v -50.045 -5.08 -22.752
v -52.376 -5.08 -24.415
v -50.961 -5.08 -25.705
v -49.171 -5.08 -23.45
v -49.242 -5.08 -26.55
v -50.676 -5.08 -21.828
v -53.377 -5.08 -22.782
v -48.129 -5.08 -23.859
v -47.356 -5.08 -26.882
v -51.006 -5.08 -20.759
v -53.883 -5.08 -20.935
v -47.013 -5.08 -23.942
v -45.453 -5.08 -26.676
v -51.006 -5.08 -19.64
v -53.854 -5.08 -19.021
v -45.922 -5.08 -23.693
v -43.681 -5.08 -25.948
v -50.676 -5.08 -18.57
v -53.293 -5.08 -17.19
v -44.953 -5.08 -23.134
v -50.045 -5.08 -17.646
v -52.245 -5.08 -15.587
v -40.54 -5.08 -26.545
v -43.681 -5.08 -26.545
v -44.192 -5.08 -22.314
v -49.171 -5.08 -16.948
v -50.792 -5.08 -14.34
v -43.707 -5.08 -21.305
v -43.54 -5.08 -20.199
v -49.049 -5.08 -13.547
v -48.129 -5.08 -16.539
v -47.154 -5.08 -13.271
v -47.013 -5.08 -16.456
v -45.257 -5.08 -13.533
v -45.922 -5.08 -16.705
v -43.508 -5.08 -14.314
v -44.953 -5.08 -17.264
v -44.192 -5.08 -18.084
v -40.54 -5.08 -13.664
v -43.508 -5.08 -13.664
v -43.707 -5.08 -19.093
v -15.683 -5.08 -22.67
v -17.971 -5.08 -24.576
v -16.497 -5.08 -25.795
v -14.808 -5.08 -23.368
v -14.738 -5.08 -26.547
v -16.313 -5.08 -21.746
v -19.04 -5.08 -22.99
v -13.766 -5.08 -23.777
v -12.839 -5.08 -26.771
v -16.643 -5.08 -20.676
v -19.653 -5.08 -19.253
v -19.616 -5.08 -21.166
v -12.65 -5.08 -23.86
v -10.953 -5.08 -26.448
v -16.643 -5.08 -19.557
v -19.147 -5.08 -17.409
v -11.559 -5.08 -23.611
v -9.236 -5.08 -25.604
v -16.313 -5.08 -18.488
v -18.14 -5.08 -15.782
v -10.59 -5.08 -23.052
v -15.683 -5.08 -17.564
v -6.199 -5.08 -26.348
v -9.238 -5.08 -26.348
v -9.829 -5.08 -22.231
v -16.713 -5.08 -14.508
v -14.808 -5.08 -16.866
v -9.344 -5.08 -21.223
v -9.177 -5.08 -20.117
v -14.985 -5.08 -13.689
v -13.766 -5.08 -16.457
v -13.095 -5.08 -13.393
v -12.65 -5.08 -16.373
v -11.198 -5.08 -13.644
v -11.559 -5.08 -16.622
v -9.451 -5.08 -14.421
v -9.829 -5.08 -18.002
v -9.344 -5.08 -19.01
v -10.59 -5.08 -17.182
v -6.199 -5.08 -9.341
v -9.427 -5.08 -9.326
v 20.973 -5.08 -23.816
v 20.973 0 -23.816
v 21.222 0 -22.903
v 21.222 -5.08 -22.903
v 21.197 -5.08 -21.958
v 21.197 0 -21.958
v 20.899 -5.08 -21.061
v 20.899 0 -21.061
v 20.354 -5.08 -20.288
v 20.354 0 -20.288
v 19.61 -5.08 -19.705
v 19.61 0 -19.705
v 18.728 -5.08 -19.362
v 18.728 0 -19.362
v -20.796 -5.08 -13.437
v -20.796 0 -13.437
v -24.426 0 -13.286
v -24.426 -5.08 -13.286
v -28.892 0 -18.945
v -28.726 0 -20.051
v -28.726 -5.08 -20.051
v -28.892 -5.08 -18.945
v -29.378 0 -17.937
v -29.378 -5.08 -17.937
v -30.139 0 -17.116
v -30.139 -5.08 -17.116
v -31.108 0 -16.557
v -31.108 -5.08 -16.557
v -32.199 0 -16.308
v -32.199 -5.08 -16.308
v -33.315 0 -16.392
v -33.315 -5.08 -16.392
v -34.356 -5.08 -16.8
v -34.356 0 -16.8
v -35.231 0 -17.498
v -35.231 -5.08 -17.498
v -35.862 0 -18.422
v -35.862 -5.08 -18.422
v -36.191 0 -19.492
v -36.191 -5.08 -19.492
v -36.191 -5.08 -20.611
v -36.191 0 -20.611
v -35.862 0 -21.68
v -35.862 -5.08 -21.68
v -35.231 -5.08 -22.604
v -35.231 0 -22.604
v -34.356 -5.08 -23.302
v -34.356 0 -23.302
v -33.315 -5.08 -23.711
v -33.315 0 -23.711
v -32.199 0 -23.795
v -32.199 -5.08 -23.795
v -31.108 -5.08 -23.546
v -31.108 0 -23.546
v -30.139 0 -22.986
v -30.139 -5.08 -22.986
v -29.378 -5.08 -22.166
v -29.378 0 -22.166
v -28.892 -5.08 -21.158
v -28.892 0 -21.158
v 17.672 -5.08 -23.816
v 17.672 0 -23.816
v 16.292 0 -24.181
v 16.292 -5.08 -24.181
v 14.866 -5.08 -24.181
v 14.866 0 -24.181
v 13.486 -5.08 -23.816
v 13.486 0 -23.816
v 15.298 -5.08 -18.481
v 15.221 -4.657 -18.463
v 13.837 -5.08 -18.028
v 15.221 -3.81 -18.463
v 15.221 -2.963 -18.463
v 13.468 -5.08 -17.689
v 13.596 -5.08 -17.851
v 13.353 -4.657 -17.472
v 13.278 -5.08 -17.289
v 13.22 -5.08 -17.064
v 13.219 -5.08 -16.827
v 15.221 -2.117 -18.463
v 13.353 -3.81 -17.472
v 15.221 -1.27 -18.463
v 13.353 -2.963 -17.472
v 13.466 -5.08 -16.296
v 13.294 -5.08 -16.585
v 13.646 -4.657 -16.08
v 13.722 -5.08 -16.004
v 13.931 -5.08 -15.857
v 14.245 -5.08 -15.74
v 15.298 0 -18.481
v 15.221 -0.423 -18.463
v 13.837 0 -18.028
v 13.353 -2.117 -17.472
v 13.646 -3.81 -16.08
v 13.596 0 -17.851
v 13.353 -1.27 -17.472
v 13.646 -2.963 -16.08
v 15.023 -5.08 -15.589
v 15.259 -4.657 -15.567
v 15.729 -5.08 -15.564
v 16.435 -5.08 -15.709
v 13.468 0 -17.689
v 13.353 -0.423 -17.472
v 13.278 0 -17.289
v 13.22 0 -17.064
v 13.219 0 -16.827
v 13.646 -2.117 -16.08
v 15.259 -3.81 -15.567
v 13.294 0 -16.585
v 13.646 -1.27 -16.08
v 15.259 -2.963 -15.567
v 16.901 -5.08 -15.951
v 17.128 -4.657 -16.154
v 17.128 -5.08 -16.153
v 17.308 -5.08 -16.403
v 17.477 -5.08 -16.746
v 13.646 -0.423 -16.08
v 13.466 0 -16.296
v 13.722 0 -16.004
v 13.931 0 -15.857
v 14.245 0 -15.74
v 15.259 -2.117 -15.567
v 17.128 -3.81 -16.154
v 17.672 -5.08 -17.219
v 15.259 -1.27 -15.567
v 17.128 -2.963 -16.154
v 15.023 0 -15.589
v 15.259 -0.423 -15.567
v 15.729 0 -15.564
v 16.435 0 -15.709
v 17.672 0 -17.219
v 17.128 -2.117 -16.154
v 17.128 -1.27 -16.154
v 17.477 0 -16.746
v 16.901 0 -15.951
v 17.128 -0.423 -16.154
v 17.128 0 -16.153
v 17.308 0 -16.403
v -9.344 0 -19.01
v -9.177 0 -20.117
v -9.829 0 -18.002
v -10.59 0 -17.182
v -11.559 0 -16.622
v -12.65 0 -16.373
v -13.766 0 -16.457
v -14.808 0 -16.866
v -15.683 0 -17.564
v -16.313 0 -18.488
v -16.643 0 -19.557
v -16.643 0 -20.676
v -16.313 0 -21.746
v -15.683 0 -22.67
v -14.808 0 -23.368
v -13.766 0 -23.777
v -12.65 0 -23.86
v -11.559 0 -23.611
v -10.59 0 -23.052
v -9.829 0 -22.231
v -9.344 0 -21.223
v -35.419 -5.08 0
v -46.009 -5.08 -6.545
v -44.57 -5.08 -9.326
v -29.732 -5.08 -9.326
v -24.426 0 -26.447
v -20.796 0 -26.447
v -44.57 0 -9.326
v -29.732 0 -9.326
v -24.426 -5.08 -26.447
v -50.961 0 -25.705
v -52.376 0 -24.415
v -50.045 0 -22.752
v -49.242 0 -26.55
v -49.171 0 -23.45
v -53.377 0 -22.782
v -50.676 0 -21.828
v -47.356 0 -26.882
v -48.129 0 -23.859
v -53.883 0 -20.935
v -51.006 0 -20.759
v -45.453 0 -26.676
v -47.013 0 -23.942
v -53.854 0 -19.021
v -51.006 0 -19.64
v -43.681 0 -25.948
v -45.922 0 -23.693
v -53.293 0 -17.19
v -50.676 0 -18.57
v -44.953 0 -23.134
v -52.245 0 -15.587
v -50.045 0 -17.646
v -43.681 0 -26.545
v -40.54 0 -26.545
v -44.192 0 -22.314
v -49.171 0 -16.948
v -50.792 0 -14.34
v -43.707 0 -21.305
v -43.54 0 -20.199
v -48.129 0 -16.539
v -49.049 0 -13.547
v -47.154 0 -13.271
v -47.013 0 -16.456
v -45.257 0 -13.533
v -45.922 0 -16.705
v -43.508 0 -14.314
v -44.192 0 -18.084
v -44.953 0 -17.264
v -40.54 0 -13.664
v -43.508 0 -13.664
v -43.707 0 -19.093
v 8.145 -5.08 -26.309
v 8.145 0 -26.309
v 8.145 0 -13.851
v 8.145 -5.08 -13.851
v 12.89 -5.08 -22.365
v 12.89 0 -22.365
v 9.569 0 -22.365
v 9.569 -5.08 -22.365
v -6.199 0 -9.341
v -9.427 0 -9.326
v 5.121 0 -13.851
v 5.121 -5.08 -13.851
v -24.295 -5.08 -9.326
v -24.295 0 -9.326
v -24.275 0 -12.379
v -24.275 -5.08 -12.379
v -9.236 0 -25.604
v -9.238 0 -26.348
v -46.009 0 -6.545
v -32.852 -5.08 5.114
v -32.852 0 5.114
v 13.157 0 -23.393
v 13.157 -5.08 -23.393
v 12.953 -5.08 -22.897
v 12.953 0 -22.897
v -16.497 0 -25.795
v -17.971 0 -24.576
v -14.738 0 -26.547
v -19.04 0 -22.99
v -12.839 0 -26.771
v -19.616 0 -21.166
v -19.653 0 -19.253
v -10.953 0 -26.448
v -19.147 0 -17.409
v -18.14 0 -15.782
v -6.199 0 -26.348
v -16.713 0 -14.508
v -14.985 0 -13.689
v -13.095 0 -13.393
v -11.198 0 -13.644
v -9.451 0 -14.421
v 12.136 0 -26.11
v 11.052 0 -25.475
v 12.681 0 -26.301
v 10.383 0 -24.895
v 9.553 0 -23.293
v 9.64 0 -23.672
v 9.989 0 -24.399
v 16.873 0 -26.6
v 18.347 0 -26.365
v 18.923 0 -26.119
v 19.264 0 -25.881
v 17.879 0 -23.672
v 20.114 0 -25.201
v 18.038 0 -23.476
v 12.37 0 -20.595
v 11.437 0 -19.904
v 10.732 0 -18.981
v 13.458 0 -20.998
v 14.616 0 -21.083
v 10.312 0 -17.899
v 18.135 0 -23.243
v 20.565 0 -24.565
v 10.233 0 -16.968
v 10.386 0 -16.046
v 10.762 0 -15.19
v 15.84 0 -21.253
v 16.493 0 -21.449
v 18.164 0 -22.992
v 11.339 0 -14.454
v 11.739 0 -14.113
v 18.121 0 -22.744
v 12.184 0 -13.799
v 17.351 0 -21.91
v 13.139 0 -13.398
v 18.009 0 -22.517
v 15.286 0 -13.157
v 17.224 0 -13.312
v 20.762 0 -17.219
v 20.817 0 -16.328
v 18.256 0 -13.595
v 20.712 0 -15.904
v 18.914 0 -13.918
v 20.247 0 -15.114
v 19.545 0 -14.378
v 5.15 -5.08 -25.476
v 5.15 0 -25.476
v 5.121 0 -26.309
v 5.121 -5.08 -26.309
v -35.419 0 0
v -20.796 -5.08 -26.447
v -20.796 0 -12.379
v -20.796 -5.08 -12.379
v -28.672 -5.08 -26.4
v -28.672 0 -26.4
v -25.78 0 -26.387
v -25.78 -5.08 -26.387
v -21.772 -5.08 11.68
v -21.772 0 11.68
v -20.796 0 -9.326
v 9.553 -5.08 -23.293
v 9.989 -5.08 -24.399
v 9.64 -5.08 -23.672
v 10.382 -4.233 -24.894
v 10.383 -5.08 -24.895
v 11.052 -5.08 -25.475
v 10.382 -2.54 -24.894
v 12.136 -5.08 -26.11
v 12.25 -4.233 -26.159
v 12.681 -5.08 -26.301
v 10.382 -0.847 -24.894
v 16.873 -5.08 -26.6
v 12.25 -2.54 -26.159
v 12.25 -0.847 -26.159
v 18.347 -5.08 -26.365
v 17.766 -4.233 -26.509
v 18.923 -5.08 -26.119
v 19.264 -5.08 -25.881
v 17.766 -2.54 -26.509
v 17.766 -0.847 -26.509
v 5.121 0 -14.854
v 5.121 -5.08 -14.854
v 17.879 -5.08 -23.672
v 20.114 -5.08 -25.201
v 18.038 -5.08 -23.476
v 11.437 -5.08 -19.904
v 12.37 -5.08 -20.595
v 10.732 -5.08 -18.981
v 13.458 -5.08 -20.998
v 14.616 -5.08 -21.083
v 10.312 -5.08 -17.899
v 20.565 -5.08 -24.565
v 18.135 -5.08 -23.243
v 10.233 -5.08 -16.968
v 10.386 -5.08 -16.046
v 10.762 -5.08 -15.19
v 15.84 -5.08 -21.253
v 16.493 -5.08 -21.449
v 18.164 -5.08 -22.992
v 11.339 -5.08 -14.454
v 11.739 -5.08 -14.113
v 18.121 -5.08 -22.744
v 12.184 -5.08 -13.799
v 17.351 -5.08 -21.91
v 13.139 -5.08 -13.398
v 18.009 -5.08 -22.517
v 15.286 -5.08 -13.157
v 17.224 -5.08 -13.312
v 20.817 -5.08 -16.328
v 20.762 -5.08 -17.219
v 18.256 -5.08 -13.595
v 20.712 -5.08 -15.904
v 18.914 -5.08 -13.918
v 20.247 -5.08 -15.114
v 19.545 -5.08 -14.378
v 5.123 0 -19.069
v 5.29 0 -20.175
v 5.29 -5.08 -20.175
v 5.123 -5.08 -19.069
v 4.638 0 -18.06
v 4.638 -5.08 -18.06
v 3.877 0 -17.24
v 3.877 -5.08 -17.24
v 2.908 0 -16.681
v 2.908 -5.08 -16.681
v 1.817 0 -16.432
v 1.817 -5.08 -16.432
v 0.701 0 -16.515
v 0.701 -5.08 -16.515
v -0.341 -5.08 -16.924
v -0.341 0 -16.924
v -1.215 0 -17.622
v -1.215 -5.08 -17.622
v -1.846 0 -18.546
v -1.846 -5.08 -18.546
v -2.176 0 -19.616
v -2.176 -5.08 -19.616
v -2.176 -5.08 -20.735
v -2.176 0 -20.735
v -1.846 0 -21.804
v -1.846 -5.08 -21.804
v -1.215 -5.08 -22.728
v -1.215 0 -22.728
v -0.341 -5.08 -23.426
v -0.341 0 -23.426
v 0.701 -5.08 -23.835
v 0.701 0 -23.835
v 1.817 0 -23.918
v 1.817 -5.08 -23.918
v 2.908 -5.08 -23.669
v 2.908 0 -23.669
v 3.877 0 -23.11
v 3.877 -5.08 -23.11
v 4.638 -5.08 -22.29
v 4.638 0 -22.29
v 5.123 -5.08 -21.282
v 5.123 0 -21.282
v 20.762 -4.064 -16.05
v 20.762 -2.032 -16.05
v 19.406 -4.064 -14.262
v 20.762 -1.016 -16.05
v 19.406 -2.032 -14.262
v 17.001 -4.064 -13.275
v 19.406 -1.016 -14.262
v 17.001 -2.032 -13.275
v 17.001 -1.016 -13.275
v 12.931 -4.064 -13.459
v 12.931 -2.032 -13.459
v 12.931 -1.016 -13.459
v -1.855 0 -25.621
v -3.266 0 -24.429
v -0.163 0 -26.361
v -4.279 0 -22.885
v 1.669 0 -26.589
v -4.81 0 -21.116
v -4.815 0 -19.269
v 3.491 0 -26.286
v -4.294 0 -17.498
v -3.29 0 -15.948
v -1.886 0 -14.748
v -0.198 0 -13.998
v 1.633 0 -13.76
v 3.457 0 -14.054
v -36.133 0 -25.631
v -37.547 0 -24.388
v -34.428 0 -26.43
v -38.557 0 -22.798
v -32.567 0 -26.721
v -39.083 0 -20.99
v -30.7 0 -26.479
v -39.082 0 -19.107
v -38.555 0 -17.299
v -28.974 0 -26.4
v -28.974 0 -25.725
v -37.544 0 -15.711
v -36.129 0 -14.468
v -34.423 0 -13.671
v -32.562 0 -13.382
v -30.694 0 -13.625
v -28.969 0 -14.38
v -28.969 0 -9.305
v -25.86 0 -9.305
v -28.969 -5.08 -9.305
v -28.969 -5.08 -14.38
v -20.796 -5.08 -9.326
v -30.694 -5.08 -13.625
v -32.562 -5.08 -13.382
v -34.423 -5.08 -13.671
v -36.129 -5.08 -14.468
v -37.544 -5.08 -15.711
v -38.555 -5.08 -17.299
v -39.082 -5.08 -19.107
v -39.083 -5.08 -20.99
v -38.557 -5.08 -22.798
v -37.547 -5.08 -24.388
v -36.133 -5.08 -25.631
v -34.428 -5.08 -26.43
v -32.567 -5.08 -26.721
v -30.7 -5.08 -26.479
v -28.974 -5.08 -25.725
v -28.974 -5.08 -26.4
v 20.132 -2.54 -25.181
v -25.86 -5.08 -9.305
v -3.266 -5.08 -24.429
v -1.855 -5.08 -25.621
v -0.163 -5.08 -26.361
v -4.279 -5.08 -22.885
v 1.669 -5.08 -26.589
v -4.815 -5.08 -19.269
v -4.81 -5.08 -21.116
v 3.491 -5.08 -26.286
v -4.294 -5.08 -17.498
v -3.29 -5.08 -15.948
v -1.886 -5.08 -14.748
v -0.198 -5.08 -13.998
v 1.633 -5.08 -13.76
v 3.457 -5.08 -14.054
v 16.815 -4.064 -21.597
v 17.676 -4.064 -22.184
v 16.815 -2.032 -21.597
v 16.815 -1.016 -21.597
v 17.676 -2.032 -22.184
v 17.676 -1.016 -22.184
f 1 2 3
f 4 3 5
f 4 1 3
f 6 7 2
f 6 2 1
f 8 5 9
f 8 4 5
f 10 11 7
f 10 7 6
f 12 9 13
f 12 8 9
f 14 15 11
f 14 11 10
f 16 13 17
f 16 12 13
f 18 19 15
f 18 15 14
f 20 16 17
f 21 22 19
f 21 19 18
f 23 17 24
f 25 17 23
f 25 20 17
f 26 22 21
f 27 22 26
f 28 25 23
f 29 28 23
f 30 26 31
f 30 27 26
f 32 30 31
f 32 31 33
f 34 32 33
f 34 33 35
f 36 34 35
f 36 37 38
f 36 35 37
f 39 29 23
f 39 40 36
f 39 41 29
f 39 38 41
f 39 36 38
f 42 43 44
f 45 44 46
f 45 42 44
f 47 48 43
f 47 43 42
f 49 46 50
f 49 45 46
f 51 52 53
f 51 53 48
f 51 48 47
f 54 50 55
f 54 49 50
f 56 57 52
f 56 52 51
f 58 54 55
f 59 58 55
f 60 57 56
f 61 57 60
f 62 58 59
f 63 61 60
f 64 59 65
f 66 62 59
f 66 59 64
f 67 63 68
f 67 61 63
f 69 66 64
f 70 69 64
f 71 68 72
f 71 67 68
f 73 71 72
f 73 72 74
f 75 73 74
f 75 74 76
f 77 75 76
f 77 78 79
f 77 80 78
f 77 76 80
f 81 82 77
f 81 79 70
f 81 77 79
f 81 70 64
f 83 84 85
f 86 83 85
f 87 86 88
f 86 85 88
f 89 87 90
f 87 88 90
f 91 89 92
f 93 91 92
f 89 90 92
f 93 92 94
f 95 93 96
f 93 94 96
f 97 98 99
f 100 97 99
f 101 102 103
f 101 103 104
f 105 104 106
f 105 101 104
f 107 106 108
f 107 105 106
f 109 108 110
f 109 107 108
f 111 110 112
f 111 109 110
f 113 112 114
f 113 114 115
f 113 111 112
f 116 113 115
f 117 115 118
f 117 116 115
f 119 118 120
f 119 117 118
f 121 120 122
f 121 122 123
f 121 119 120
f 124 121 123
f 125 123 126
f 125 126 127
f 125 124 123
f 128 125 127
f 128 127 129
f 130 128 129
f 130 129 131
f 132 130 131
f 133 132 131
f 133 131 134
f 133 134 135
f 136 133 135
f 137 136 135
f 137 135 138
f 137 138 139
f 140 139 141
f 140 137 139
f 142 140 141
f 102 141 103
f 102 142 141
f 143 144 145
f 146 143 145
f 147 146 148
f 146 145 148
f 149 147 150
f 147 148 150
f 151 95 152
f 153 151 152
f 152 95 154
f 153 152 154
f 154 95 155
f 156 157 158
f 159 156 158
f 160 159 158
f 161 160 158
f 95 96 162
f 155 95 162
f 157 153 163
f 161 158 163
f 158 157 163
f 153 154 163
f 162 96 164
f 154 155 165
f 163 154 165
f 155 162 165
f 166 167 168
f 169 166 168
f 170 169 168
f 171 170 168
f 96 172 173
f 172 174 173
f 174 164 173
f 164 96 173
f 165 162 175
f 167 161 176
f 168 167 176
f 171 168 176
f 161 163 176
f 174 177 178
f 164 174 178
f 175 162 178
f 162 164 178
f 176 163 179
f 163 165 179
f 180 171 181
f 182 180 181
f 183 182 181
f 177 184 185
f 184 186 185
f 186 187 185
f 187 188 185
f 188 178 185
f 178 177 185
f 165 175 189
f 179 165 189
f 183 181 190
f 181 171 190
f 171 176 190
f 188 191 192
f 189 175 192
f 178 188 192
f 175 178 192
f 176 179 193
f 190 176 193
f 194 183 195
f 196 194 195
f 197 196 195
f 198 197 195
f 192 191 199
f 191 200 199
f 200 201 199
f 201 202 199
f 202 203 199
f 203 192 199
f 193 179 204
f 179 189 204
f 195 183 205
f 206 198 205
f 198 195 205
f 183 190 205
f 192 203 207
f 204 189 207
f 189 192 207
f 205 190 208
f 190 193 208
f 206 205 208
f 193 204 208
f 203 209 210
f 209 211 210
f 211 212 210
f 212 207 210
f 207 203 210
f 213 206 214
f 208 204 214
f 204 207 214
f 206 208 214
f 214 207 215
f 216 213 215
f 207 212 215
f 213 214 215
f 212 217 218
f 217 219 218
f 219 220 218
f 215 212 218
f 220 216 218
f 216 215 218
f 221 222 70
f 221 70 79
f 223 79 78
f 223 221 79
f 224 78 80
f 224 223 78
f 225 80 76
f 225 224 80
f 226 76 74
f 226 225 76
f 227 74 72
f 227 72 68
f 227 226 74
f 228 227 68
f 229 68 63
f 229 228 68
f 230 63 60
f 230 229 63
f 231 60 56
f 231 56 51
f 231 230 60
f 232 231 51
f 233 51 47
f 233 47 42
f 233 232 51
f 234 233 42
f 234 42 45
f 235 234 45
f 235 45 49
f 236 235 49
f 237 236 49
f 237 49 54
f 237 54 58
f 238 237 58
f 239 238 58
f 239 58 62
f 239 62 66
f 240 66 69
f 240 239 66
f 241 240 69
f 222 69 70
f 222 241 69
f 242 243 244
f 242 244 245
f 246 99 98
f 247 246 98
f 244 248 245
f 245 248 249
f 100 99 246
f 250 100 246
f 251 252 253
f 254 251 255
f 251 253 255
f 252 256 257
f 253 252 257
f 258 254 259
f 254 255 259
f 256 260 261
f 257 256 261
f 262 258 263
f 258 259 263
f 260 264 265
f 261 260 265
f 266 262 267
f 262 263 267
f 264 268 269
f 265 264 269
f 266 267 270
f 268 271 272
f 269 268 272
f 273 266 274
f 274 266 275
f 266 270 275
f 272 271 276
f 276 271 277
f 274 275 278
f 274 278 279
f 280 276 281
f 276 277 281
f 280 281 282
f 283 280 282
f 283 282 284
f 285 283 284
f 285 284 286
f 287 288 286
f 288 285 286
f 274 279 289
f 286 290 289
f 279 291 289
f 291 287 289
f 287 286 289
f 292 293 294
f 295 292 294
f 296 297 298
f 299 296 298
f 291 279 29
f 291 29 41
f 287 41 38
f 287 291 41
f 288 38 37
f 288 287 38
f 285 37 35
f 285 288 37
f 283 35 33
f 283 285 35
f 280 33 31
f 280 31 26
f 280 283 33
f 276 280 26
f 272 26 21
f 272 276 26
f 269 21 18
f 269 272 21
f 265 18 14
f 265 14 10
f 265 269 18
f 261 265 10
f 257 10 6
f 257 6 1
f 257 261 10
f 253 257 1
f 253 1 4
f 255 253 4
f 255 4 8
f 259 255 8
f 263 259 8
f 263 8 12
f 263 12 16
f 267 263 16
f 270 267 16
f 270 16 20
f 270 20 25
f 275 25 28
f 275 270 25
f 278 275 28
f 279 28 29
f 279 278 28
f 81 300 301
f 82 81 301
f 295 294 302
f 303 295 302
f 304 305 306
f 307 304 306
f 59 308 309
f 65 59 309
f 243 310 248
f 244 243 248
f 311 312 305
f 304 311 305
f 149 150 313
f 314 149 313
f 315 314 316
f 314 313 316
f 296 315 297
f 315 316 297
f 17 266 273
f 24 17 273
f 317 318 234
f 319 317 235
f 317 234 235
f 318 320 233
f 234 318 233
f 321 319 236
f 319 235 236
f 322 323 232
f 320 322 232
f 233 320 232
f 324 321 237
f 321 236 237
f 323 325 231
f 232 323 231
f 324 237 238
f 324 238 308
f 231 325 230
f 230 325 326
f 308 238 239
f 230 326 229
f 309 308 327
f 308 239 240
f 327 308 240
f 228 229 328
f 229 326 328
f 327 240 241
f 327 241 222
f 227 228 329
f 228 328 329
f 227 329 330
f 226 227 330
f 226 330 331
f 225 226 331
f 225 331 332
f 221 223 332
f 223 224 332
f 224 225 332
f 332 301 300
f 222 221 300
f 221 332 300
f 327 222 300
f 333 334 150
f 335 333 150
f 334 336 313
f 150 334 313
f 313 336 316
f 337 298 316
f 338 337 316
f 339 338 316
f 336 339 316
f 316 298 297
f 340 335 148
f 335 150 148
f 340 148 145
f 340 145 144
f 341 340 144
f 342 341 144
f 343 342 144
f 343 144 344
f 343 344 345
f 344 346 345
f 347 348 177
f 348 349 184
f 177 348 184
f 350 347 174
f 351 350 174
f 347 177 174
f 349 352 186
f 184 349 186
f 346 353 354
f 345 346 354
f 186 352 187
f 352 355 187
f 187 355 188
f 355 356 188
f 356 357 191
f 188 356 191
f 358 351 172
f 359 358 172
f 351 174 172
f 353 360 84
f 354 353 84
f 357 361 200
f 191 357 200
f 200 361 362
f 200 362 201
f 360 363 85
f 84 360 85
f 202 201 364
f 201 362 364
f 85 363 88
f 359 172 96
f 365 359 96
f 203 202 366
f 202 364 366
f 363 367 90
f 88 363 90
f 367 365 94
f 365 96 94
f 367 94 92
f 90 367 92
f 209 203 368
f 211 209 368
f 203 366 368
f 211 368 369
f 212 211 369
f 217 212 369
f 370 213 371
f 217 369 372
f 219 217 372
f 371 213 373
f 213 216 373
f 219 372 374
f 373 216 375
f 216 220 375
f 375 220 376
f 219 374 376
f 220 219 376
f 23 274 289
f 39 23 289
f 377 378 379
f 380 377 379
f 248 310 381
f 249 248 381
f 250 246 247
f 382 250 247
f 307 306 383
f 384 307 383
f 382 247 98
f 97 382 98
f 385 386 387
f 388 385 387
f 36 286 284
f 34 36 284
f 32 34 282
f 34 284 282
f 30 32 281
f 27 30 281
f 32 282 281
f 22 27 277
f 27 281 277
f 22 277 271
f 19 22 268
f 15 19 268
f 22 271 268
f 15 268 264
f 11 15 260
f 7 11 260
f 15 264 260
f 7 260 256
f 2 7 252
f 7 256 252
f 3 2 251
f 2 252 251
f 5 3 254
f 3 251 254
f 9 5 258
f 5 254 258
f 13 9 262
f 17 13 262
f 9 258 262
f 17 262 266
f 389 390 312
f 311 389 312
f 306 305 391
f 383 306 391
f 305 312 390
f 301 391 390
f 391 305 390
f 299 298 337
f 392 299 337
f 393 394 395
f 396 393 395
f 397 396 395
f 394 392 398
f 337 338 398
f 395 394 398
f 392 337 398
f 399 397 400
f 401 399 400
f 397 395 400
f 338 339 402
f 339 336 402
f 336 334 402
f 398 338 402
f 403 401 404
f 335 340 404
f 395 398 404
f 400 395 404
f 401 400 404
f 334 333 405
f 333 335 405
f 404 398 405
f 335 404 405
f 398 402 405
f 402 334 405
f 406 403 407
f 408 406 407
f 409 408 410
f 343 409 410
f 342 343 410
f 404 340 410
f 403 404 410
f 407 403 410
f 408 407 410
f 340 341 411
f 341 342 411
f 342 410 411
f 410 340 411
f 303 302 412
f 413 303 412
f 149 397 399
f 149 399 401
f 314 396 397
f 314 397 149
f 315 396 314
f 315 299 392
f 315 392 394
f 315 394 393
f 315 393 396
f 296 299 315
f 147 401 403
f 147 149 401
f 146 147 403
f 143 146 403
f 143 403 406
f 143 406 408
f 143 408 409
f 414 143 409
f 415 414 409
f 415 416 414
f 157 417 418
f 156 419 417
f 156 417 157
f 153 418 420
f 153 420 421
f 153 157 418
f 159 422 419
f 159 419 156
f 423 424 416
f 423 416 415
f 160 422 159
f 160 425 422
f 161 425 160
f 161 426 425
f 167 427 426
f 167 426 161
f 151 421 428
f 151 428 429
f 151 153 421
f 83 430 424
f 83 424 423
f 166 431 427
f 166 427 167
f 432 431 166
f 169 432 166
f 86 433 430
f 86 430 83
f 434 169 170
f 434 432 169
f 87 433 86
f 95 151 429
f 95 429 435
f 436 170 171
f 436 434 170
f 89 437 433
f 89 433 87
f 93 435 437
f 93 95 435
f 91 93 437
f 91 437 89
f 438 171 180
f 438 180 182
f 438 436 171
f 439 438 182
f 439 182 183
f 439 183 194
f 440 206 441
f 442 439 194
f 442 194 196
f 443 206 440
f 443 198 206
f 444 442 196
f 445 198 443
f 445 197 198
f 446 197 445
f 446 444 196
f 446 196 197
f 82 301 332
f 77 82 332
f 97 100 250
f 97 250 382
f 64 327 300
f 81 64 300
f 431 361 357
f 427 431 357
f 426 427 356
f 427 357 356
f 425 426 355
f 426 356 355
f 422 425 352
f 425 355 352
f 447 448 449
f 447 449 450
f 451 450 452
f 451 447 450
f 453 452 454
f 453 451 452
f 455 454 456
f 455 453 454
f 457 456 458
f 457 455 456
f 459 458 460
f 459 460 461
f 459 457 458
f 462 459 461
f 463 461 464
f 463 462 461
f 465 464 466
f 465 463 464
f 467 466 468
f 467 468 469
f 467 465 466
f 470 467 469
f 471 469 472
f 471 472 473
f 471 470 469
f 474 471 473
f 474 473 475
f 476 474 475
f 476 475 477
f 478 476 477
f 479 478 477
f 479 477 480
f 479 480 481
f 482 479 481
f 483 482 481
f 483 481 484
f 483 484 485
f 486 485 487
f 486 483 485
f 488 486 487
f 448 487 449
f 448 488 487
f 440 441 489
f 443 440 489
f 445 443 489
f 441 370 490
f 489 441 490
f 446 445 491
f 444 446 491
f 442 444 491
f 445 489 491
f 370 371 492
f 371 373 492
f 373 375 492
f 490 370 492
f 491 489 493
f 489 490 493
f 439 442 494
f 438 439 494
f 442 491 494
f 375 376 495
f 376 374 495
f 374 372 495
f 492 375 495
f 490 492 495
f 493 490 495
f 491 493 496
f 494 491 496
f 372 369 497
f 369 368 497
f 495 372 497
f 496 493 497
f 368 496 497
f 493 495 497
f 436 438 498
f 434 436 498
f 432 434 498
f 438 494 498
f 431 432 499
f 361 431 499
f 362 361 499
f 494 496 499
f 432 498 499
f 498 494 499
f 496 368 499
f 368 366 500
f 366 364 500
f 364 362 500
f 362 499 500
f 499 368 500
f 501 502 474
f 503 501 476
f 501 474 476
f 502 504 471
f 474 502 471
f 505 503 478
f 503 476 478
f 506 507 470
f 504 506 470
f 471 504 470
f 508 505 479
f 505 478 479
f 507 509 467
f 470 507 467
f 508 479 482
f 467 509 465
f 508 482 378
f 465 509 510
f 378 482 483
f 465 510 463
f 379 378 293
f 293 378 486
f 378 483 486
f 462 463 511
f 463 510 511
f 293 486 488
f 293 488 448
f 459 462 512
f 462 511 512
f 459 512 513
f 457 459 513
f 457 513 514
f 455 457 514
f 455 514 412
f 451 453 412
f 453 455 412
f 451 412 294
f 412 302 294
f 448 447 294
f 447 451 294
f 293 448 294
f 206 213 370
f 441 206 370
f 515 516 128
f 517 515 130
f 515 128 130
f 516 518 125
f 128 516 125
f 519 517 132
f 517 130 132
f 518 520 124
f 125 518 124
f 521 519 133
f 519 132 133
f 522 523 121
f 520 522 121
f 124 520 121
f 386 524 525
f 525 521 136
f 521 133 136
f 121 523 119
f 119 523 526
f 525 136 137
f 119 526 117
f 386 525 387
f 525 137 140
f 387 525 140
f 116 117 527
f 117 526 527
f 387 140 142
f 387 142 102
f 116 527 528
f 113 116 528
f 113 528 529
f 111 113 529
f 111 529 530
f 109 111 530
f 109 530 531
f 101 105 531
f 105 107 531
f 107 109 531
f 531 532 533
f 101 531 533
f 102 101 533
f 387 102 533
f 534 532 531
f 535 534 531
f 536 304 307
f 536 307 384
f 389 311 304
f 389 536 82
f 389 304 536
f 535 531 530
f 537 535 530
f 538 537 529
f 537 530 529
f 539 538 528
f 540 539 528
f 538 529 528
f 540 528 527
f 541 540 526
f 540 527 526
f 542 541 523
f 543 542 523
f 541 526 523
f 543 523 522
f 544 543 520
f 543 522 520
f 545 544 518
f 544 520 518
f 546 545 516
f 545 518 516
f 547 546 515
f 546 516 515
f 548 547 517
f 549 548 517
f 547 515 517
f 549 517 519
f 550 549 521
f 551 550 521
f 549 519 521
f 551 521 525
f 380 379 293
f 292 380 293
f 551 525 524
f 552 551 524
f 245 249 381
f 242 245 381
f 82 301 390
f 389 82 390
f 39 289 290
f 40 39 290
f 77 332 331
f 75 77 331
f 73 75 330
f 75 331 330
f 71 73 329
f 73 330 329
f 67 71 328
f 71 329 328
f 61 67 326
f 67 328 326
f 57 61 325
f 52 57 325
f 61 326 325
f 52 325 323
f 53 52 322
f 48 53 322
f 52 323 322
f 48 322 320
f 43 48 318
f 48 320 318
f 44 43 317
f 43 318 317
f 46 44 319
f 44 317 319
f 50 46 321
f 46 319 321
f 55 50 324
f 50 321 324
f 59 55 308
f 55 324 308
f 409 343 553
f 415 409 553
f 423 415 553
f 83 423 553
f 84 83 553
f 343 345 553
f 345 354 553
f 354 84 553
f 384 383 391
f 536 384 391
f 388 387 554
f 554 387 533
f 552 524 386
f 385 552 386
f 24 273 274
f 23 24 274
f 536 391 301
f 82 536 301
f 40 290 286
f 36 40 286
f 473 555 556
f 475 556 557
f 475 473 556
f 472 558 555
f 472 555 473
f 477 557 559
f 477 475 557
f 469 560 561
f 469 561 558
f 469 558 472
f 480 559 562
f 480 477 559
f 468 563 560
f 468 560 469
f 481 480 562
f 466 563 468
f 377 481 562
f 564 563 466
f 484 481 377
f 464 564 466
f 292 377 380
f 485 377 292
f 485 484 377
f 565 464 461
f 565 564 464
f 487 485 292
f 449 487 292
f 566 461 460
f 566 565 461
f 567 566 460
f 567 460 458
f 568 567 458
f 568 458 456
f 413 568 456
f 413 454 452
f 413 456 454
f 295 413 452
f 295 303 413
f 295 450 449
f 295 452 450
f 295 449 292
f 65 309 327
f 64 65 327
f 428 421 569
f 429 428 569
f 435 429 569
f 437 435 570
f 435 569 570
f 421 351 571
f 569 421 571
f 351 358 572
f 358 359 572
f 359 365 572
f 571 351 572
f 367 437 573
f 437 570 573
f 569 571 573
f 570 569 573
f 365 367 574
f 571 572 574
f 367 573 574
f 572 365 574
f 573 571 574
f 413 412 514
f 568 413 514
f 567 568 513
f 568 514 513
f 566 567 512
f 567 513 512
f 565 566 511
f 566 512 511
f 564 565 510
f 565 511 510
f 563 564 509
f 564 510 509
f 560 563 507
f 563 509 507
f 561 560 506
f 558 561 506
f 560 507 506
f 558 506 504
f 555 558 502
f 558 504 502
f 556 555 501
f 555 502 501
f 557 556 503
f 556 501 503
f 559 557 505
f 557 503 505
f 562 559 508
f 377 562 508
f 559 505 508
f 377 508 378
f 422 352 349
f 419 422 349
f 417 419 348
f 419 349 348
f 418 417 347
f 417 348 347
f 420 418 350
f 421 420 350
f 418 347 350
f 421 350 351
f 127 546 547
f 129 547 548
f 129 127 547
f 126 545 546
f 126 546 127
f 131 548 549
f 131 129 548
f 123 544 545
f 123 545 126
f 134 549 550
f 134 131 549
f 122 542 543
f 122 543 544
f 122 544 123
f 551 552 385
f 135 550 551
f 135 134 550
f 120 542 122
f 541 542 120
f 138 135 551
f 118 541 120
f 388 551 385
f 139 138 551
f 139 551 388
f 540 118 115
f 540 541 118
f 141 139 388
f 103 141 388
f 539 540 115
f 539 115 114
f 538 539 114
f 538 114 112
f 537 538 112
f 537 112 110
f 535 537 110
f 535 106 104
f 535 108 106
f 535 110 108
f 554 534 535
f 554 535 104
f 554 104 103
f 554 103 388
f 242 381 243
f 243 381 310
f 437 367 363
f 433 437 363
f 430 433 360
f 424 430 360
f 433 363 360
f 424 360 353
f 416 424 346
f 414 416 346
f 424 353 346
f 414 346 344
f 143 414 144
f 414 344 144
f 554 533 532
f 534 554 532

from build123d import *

# Parameters (mm, degrees)
F1_DEPTH = 5.08
F0_R     = 3.7538373981


with BuildPart() as f1:
    # F0 (on Front) → F1 (new body)
    with BuildSketch(Plane.XZ):
        Polygon((-35.4193560779, 0), (-46.0087582469, -6.5453746356), (-44.5702800546, -9.3264291063), (-29.7320385329, -9.3264291063), align=None)
    extrude(amount=F1_DEPTH)


with BuildPart() as f1b:
    # F0 (on Front) → F1, piece 2 (new body)
    with BuildSketch(Plane.XZ):
        Polygon((-20.7957308739, -13.4374247864), (-24.4261976331, -13.2861547172), (-24.4261976331, -26.4465939254), (-20.7957308739, -26.4465939254), align=None)
    extrude(amount=F1_DEPTH)


with BuildPart() as f1c:
    # F0 (on Front) → F1, piece 3 (new body)
    with BuildSketch(Plane.XZ):
        with BuildLine():
            add(Edge.make_bspline(
                [(20.7620002329, -17.2191361961), (20.8072727639, -16.8563093212), (20.9972345535, -15.9582499737), (19.4142520572, -14.007102602), (17.1088858085, -13.0550807236), (12.8312386114, -13.137547353), (11.777222385, -14.0693074001), (11.3386176527, -14.4538888708)],
                knots=[0, 0, 0, 0, 0.1426258855, 0.3402628508, 0.5529546626, 0.8192153992, 1, 1, 1, 1], degree=3))
            ThreePointArc((11.3386176527, -14.4538888708), (10.3859706919, -16.0456099138), (10.3123616427, -17.8991723806))
            ThreePointArc((10.3123616427, -17.8991723806), (11.8788420686, -20.2823297917), (14.6159762517, -21.083202213))
            add(Edge.make_bspline(
                [(14.6159762517, -21.083202213), (15.0039163067, -21.1453609503), (16.0043313157, -21.2129036743), (16.7959558011, -21.5836238263), (17.2771770943, -21.8291235959), (17.6796861205, -22.1913385939), (17.9065701329, -22.3787523433), (18.0092714727, -22.517317906)],
                knots=[0, 0, 0, 0, 0.2772850418, 0.4981757712, 0.6686560416, 0.8384583572, 1, 1, 1, 1], degree=3))
            ThreePointArc((18.0092714727, -22.517317906), (18.1354842373, -23.2431646305), (17.6717407787, -23.8156374544))
            ThreePointArc((17.6717407787, -23.8156374544), (15.5790164959, -24.2269686024), (13.4862922132, -23.8156374544))
            ThreePointArc((13.4862922132, -23.8156374544), (13.0376674048, -23.1521941948), (12.8897940501, -22.3650762568))
            Line((12.8897940501, -22.3650762568), (9.569176693, -22.3650762568))
            add(Edge.make_bspline(
                [(9.569176693, -22.3650762568), (9.5361497862, -22.6772252023), (9.4524468653, -23.4559209414), (10.231733471, -25.0315592148), (12.2911542795, -26.3031608631), (13.5748731983, -26.4278250015), (17.7011171683, -26.847175168), (19.0651818481, -26.0739997387), (19.2637275904, -25.8809141815)],
                knots=[0, 0, 0, 0, 0.1218054151, 0.2789918956, 0.4596472248, 0.6020193053, 0.8467697484, 1, 1, 1, 1], degree=3))
            add(Edge.make_bspline(
                [(19.2637275904, -25.8809141815), (19.5658528496, -25.681008759), (20.2303288514, -25.241348877), (20.711178218, -24.3187482231), (20.9733940461, -23.8156374544)],
                knots=[0, 0, 0, 0, 0.4546819726, 1, 1, 1, 1], degree=3))
            ThreePointArc((20.9733940461, -23.8156374544), (20.898861515, -21.0606348014), (18.7283706874, -19.362234294))
            add(Edge.make_bspline(
                [(18.7283706874, -19.362234294), (18.3052221446, -19.2454177359), (17.3465319172, -18.9807828356), (15.2853598147, -18.476270678), (13.6934778991, -18.0951068109), (13.3382544883, -17.4914174359), (13.0869415617, -16.7805254227), (13.6425426453, -16.0415724969), (14.0256014445, -15.7577248311), (15.2913806307, -15.5033570912), (16.3332392912, -15.6038072113), (17.1883368221, -16.0725065084), (17.5126857245, -16.8202796174), (17.6196698386, -17.1023734287), (17.6717407787, -17.2191361961)],
                knots=[0, 0, 0, 0, 0.1006907781, 0.2266515058, 0.3326625833, 0.3997628616, 0.4701676224, 0.5473676774, 0.6065693887, 0.7006658095, 0.7890167461, 0.8703441811, 0.9451782391, 1, 1, 1, 1], degree=3))
            Line((17.6717407787, -17.2191361961), (20.7620002329, -17.2191361961))
        make_face()
    extrude(amount=F1_DEPTH)


with BuildPart() as f1d:
    # F0 (on Front) → F1, piece 4 (new body)
    with BuildSketch(Plane.XZ):
        Polygon((-21.772207953, 11.6795980458), (-32.8522287309, 5.1136612892), (-24.2951400578, -9.3264291063), (-20.7957308739, -9.3264291063), (-9.4271954149, -9.3264291063), align=None)
        Polygon((-20.7957308739, -9.3264291063), (-24.2951400578, -9.3264291063), (-24.2749284953, -12.3785389587), (-20.7957308739, -12.3785389587), align=None)
    extrude(amount=F1_DEPTH)


with BuildPart() as f1e:
    # F0 (on Front) → F1, piece 5 (new body)
    with BuildSketch(Plane.XZ):
        with BuildLine():
            Line((-43.5080304742, -13.6637622491), (-43.5080304742, -14.3139054999))
            ThreePointArc((-43.5080304742, -14.3139054999), (-53.9360326233, -19.9770668695), (-43.6813160777, -25.9482823312))
            Line((-43.6813160777, -25.9482823312), (-43.6813160777, -26.5446212143))
            Line((-43.6813160777, -26.5446212143), (-40.5400656164, -26.5446212143))
            Line((-40.5400656164, -26.5446212143), (-40.5400656164, -13.6637622491))
            Line((-40.5400656164, -13.6637622491), (-43.5080304742, -13.6637622491))
        make_face()
        with Locations((-47.2937338054, -20.1990362257)):
            Circle(F0_R, mode=Mode.SUBTRACT)
    extrude(amount=F1_DEPTH)


with BuildPart() as f1f:
    # F0 (on Front) → F1, piece 6 (new body)
    with BuildSketch(Plane.XZ):
        with BuildLine():
            Line((-28.9690925023, -9.3052648008), (-28.9690925023, -14.3798987605))
            ThreePointArc((-28.9690925023, -14.3798987605), (-39.1494319925, -20.0484505957), (-28.9738103747, -25.7254671305))
            Line((-28.9738103747, -25.7254671305), (-28.9738103747, -26.4002234317))
            Line((-28.9738103747, -26.4002234317), (-28.6721715531, -26.4002234317))
            Line((-28.6721715531, -26.4002234317), (-25.7797478715, -26.3865933846))
            Line((-25.7797478715, -26.3865933846), (-25.860240683, -9.3052648008))
            Line((-25.860240683, -9.3052648008), (-28.9690925023, -9.3052648008))
        make_face()
        with Locations((-32.4795544147, -20.0512241572)):
            Circle(F0_R, mode=Mode.SUBTRACT)
    extrude(amount=F1_DEPTH)


with BuildPart() as f1g:
    # F0 (on Front) → F1, piece 7 (new body)
    with BuildSketch(Plane.XZ):
        with BuildLine():
            Line((-6.1985242487, -9.3412151397), (-9.4271954149, -9.3264291063))
            Line((-9.4271954149, -9.3264291063), (-9.4505250454, -14.4206760451))
            ThreePointArc((-9.4505250454, -14.4206760451), (-19.703495851, -20.2107797198), (-9.2364614829, -25.6042852998))
            Line((-9.2364614829, -25.6042852998), (-9.2380829155, -26.3478271663))
            Line((-9.2380829155, -26.3478271663), (-6.1985242487, -26.3478271663))
            Line((-6.1985242487, -26.3478271663), (-6.1985242487, -9.3412151397))
        make_face()
        with Locations((-12.9307592288, -20.1167901978)):
            Circle(F0_R, mode=Mode.SUBTRACT)
    extrude(amount=F1_DEPTH)


with BuildPart() as f1h:
    # F0 (on Front) → F1, piece 8 (new body)
    with BuildSketch(Plane.XZ):
        with BuildLine():
            Line((5.1207156486, -14.4008146599), (5.1207156486, -14.8542305873))
            ThreePointArc((5.1207156486, -14.8542305873), (-4.8791269628, -20.1930324208), (5.1504089497, -25.4758410156))
            Line((5.1504089497, -25.4758410156), (5.1207156486, -26.3085495681))
            Line((5.1207156486, -26.3085495681), (8.1453863531, -26.3085495681))
            Line((8.1453863531, -26.3085495681), (8.1453863531, -13.8509906828))
            Line((8.1453863531, -13.8509906828), (5.1207156486, -13.8509906828))
            Line((5.1207156486, -13.8509906828), (5.1207156486, -14.4008146599))
        make_face()
        with Locations((1.5363817802, -20.1750975102)):
            Circle(F0_R, mode=Mode.SUBTRACT)
    extrude(amount=F1_DEPTH)


solid = Compound([f1.part, f1b.part, f1c.part, f1d.part, f1e.part, f1f.part, f1g.part, f1h.part])
